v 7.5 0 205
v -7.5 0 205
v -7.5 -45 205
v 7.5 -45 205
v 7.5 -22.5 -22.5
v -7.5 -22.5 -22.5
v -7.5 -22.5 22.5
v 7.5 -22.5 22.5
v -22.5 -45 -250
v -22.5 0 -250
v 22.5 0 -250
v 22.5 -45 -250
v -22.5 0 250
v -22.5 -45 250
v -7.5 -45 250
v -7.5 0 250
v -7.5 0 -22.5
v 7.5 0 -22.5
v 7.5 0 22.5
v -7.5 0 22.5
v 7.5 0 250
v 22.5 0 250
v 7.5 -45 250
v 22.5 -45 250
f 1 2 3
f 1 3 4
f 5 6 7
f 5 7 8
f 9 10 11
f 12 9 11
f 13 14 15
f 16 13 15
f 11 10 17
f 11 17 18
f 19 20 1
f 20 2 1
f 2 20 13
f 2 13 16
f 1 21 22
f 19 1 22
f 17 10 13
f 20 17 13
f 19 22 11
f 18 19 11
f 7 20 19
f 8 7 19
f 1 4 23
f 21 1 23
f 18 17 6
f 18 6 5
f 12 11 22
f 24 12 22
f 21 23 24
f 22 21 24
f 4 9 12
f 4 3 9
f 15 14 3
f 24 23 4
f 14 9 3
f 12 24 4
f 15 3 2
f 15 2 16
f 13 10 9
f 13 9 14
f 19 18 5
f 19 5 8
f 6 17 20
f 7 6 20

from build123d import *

# Parameters (mm, degrees)
F0_W     = 45
F0_H     = 500
F1_DEPTH = 45
F2_W     = 15
F2_H     = 45
F3_DEPTH = 94
F4_W     = 15
F4_H     = 45
F5_DEPTH = 22.5


with BuildPart() as f1:
    # F0 (on Front) → F1 (new body)
    with BuildSketch(Plane.XZ):
        Rectangle(F0_W, F0_H)
    extrude(amount=F1_DEPTH)

    # F2 (on face) → F3 (cut)
    with BuildSketch(Plane.XZ.offset(45)):
        with Locations((0, 227.5)):
            Rectangle(F2_W, F2_H)
    extrude(amount=-F3_DEPTH, mode=Mode.SUBTRACT)

    # F4 (on Front) → F5 (cut)
    with BuildSketch(Plane.XZ):
        Rectangle(F4_W, F4_H)
    extrude(amount=F5_DEPTH, mode=Mode.SUBTRACT)


solid = f1.part
